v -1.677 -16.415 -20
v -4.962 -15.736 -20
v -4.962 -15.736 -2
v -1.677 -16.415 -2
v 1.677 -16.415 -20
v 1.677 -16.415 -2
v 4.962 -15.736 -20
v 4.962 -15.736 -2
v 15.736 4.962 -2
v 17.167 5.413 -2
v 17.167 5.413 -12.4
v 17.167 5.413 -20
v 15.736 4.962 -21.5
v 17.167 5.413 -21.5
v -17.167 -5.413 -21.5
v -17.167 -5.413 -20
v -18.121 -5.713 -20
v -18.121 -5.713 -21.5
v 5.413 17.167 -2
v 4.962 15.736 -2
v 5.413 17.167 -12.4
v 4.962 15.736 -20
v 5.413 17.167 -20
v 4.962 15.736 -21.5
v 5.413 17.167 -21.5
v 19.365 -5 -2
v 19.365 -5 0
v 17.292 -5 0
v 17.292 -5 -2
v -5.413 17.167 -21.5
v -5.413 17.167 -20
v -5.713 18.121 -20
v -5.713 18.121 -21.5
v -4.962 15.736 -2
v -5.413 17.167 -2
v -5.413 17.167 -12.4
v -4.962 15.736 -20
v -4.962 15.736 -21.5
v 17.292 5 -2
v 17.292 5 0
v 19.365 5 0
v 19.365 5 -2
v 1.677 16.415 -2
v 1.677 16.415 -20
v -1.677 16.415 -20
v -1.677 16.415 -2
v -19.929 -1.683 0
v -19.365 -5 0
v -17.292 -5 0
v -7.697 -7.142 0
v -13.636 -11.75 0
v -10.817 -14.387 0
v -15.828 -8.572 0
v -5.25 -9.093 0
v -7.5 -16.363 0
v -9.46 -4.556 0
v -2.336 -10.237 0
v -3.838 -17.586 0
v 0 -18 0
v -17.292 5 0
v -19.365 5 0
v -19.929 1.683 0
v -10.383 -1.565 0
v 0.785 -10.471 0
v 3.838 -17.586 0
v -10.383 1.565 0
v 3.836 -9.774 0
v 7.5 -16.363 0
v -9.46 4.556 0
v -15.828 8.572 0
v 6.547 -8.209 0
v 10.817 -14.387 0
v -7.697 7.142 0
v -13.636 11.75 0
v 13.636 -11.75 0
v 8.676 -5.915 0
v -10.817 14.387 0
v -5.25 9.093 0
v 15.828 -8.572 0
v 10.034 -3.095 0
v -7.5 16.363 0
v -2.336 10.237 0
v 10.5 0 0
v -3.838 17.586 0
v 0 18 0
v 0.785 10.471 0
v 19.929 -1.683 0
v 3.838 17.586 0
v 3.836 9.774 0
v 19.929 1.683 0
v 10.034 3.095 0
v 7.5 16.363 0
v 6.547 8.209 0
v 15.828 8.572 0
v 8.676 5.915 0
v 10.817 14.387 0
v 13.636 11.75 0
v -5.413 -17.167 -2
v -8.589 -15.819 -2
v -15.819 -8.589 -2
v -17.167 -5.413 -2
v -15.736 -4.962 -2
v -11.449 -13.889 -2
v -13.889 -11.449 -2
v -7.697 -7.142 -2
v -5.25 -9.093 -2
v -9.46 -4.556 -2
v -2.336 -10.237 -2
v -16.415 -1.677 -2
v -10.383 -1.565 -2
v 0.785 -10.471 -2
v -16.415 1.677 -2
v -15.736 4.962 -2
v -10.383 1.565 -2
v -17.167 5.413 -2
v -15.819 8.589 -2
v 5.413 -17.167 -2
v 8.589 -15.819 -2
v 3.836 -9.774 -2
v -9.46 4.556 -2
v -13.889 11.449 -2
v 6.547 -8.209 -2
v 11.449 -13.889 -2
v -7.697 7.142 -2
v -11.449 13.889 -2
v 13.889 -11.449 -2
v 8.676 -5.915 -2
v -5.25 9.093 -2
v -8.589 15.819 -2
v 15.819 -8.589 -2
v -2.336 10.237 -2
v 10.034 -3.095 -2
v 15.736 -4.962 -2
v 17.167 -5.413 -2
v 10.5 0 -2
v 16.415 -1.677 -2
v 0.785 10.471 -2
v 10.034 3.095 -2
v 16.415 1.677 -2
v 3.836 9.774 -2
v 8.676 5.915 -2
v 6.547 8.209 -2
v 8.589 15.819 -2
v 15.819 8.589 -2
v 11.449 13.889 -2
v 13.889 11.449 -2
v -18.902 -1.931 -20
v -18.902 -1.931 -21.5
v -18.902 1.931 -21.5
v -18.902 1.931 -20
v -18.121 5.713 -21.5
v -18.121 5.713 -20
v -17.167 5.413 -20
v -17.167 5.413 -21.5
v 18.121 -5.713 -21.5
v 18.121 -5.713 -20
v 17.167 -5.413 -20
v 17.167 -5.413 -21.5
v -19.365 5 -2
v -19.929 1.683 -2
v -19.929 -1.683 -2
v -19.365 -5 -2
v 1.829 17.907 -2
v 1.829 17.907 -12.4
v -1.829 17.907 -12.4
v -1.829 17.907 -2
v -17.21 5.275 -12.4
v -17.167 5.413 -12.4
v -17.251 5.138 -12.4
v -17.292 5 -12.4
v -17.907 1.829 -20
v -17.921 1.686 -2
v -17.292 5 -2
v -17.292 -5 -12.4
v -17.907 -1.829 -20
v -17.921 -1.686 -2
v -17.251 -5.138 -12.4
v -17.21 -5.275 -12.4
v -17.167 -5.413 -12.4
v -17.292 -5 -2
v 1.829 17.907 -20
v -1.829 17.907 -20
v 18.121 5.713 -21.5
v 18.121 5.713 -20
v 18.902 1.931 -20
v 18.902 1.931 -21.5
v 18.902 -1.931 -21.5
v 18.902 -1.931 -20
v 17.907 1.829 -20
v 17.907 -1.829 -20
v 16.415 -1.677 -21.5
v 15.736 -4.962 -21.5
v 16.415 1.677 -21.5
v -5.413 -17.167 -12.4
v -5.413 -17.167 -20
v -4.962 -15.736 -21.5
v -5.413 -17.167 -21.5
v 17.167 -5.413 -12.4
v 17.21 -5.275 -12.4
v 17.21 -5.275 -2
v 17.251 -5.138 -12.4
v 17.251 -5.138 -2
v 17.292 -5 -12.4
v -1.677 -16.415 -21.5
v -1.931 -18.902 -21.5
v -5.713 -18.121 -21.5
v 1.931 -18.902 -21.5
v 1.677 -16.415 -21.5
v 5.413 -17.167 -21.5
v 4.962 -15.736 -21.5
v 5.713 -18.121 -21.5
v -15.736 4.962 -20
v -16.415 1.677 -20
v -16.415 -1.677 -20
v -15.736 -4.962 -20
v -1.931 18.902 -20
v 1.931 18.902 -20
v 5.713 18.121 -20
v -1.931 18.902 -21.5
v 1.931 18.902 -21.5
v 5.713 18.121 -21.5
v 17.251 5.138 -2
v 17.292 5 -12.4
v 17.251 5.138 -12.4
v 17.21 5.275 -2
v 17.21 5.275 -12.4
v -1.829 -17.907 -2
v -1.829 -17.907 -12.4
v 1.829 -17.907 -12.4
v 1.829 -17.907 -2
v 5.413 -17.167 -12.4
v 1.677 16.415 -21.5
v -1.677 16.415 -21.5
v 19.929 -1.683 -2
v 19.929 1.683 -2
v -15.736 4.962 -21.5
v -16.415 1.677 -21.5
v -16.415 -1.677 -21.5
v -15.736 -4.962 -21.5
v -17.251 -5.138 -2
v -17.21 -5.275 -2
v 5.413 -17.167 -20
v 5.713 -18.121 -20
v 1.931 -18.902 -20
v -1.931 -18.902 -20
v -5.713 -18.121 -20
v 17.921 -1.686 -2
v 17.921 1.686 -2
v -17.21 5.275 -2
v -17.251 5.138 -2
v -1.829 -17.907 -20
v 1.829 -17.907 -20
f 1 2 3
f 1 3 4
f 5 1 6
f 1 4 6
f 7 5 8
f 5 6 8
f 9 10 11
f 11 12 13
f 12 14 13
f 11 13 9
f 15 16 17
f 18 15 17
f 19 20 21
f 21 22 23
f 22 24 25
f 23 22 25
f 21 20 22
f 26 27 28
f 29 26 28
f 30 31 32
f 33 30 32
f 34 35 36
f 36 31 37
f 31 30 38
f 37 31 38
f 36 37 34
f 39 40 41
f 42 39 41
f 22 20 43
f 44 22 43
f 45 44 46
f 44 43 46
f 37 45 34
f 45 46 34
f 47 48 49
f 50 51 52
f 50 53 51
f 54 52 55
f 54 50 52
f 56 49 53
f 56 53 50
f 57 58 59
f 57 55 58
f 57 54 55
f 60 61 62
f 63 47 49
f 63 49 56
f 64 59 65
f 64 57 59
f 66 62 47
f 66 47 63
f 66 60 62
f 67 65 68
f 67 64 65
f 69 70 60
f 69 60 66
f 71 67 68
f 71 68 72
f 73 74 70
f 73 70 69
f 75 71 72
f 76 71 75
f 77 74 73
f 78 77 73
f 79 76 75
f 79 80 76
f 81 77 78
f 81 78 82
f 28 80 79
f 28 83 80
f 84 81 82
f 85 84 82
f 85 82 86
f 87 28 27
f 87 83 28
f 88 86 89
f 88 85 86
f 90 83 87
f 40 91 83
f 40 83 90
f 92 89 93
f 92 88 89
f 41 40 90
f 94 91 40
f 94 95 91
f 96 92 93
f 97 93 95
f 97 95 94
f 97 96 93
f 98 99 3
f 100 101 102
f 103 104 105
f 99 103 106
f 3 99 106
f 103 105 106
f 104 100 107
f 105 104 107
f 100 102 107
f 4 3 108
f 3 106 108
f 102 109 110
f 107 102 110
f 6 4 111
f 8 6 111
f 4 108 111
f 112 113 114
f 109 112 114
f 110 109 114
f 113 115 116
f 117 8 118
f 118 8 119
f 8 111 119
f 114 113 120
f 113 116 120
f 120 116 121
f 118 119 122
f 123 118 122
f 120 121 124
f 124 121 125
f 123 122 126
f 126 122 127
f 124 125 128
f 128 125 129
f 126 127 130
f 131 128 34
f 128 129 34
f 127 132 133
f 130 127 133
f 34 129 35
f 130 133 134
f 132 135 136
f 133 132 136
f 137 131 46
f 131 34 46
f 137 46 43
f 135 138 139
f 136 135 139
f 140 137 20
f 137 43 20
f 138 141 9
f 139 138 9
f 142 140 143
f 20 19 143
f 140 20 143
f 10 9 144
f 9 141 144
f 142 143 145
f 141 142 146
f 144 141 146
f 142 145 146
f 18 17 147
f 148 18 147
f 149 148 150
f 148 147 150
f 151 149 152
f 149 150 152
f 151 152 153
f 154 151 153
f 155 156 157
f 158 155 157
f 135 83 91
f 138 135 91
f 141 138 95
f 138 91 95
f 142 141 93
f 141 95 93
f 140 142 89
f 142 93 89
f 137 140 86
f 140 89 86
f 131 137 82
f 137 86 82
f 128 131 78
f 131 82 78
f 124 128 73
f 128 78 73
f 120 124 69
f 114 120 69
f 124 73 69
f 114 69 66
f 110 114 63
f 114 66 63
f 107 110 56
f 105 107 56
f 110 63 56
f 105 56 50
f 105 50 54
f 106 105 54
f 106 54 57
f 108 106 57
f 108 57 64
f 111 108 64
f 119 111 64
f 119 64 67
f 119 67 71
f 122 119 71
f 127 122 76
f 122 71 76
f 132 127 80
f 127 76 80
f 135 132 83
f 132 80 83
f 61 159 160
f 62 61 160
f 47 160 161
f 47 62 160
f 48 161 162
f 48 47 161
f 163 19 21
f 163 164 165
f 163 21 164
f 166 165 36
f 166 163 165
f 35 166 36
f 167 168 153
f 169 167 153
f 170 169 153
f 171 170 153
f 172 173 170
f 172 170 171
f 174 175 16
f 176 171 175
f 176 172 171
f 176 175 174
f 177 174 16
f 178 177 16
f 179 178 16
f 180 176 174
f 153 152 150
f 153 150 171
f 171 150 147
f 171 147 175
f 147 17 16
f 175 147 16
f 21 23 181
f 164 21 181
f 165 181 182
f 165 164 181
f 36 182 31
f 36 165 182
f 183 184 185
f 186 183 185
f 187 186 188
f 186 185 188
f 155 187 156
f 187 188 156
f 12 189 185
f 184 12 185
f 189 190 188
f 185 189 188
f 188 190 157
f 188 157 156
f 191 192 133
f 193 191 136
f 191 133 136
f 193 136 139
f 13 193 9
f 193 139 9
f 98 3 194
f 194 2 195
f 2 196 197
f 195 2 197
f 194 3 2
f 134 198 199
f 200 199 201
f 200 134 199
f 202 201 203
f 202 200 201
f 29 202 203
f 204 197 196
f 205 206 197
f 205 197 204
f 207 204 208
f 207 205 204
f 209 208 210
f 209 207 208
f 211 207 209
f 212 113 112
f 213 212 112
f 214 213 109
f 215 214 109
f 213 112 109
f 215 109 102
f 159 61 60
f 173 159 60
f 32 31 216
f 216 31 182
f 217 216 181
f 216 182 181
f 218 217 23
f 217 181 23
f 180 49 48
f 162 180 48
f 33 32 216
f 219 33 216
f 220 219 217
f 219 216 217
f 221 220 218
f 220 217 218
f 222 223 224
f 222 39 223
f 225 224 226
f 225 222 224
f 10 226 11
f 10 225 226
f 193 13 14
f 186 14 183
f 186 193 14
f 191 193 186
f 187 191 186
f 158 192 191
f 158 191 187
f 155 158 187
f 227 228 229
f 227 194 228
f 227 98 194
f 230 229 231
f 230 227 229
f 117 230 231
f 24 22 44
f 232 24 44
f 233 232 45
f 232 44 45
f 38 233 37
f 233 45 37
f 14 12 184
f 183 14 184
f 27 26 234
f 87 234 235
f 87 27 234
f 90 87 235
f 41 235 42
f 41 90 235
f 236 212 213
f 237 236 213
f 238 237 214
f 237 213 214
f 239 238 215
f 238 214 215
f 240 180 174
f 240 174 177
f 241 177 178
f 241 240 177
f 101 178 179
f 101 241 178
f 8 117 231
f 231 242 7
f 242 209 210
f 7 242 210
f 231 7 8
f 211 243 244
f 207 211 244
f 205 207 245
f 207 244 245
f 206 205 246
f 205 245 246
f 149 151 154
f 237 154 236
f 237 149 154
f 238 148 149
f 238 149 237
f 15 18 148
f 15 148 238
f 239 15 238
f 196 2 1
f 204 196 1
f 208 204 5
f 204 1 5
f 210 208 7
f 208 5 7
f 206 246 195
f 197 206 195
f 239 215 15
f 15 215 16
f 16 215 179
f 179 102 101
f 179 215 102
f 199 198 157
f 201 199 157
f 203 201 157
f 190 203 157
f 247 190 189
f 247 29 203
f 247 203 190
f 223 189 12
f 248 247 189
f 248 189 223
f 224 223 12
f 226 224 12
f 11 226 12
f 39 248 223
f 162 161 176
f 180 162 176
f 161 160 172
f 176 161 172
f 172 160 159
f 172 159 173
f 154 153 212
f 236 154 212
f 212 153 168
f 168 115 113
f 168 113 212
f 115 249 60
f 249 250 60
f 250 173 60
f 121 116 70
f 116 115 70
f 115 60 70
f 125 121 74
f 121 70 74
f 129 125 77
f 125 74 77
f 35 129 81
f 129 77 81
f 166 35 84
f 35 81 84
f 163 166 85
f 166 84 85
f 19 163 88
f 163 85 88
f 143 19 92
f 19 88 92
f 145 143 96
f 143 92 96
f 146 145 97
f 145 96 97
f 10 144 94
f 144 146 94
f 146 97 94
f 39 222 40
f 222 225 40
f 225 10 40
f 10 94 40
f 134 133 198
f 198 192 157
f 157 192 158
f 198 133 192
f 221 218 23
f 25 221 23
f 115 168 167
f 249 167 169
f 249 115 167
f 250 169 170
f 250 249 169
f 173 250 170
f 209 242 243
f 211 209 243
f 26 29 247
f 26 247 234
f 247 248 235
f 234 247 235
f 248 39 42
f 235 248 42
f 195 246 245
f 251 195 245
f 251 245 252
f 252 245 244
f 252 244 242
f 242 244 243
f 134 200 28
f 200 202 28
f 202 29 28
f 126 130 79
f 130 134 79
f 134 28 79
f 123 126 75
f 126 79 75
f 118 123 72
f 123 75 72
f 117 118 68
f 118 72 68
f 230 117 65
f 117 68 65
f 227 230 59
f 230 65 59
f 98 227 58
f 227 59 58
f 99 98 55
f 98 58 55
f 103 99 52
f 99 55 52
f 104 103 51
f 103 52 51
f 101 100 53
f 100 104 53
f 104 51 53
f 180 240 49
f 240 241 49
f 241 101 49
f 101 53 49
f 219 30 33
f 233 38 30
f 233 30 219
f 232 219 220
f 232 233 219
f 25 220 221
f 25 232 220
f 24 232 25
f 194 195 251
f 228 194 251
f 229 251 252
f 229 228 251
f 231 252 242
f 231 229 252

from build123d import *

# Parameters (mm, degrees)
F0_R      = 18
F0_R_2    = 16.5
F1_DEPTH  = 20
F3_DEPTH  = 18
F5_DEPTH  = 1.5
F7_R      = 20
F7_R_2    = 10.5
F8_DEPTH  = 2
F10_DEPTH = 12.4


with BuildPart() as f1:
    # F0 (on Top) → F1 (new body)
    with BuildSketch(Plane.XY):
        Circle(F0_R)
        Circle(F0_R_2, mode=Mode.SUBTRACT)
    extrude(amount=-F1_DEPTH)

    # F2 (on face) → F3 (cut)
    with BuildSketch(Plane(origin=(0, 0, -20), x_dir=(1, 0, 0), z_dir=(0, 0, -1))):
        with BuildLine():
            ThreePointArc((-5.4127043911, 17.1669051135), (-12.7279220614, 12.7279220614), (-17.1669051135, 5.4127043911))
            Line((-17.1669051135, 5.4127043911), (-15.7363296873, 4.9616456918))
            ThreePointArc((-15.7363296873, 4.9616456918), (-11.6672618896, 11.6672618896), (-4.9616456918, 15.7363296873))
            Line((-4.9616456918, 15.7363296873), (-5.4127043911, 17.1669051135))
        make_face()
        with BuildLine():
            Line((-15.7363296873, -4.9616456918), (-17.1669051135, -5.4127043911))
            ThreePointArc((-17.1669051135, -5.4127043911), (-12.7279220614, -12.7279220614), (-5.4127043911, -17.1669051135))
            Line((-5.4127043911, -17.1669051135), (-4.9616456918, -15.7363296873))
            ThreePointArc((-4.9616456918, -15.7363296873), (-11.6672618896, -11.6672618896), (-15.7363296873, -4.9616456918))
        make_face()
        with BuildLine():
            ThreePointArc((15.7363296873, -4.9616456918), (11.6672618896, -11.6672618896), (4.9616456918, -15.7363296873))
            Line((4.9616456918, -15.7363296873), (5.4127043911, -17.1669051135))
            ThreePointArc((5.4127043911, -17.1669051135), (12.7279220614, -12.7279220614), (17.1669051135, -5.4127043911))
            Line((17.1669051135, -5.4127043911), (15.7363296873, -4.9616456918))
        make_face()
        with BuildLine():
            Line((5.4127043911, 17.1669051135), (4.9616456918, 15.7363296873))
            ThreePointArc((4.9616456918, 15.7363296873), (11.6672618896, 11.6672618896), (15.7363296873, 4.9616456918))
            Line((15.7363296873, 4.9616456918), (17.1669051135, 5.4127043911))
            ThreePointArc((17.1669051135, 5.4127043911), (12.7279220614, 12.7279220614), (5.4127043911, 17.1669051135))
        make_face()
    extrude(amount=-F3_DEPTH, mode=Mode.SUBTRACT)

    # F4 (on face) → F5 (join)
    with BuildSketch(Plane(origin=(0, 0, -20), x_dir=(1, 0, 0), z_dir=(0, 0, -1))):
        with BuildLine():
            Line((-15.7363296873, 4.9616456918), (-17.1669051135, 5.4127043911))
            ThreePointArc((-17.1669051135, 5.4127043911), (-18, 0), (-17.1669051135, -5.4127043911))
            Line((-17.1669051135, -5.4127043911), (-15.7363296873, -4.9616456918))
            ThreePointArc((-15.7363296873, -4.9616456918), (-16.5, 0), (-15.7363296873, 4.9616456918))
        make_face()
        with BuildLine():
            ThreePointArc((-17.1669051135, -5.4127043911), (-18, 0), (-17.1669051135, 5.4127043911))
            Line((-17.1669051135, 5.4127043911), (-18.1206220642, 5.7134101906))
            ThreePointArc((-18.1206220642, 5.7134101906), (-19, 0), (-18.1206220642, -5.7134101906))
            Line((-18.1206220642, -5.7134101906), (-17.1669051135, -5.4127043911))
        make_face()
        with BuildLine():
            ThreePointArc((4.9616456918, -15.7363296873), (0, -16.5), (-4.9616456918, -15.7363296873))
            Line((-4.9616456918, -15.7363296873), (-5.4127043911, -17.1669051135))
            ThreePointArc((-5.4127043911, -17.1669051135), (0, -18), (5.4127043911, -17.1669051135))
            Line((5.4127043911, -17.1669051135), (4.9616456918, -15.7363296873))
        make_face()
        with BuildLine():
            ThreePointArc((5.4127043911, -17.1669051135), (0, -18), (-5.4127043911, -17.1669051135))
            Line((-5.4127043911, -17.1669051135), (-5.7134101906, -18.1206220642))
            ThreePointArc((-5.7134101906, -18.1206220642), (0, -19), (5.7134101906, -18.1206220642))
            Line((5.7134101906, -18.1206220642), (5.4127043911, -17.1669051135))
        make_face()
        with BuildLine():
            ThreePointArc((15.7363296873, 4.9616456918), (16.5, 0), (15.7363296873, -4.9616456918))
            Line((15.7363296873, -4.9616456918), (17.1669051135, -5.4127043911))
            ThreePointArc((17.1669051135, -5.4127043911), (18, 0), (17.1669051135, 5.4127043911))
            Line((17.1669051135, 5.4127043911), (15.7363296873, 4.9616456918))
        make_face()
        with BuildLine():
            ThreePointArc((17.1669051135, 5.4127043911), (18, 0), (17.1669051135, -5.4127043911))
            Line((17.1669051135, -5.4127043911), (18.1206220642, -5.7134101906))
            ThreePointArc((18.1206220642, -5.7134101906), (19, 0), (18.1206220642, 5.7134101906))
            Line((18.1206220642, 5.7134101906), (17.1669051135, 5.4127043911))
        make_face()
        with BuildLine():
            ThreePointArc((-4.9616456918, 15.7363296873), (0, 16.5), (4.9616456918, 15.7363296873))
            Line((4.9616456918, 15.7363296873), (5.4127043911, 17.1669051135))
            ThreePointArc((5.4127043911, 17.1669051135), (0, 18), (-5.4127043911, 17.1669051135))
            Line((-5.4127043911, 17.1669051135), (-4.9616456918, 15.7363296873))
        make_face()
        with BuildLine():
            ThreePointArc((-5.4127043911, 17.1669051135), (0, 18), (5.4127043911, 17.1669051135))
            Line((5.4127043911, 17.1669051135), (5.7134101906, 18.1206220642))
            ThreePointArc((5.7134101906, 18.1206220642), (0, 19), (-5.7134101906, 18.1206220642))
            Line((-5.7134101906, 18.1206220642), (-5.4127043911, 17.1669051135))
        make_face()
    extrude(amount=F5_DEPTH)

    # F7 (on face) → F8 (join)
    with BuildSketch(Plane.XY):
        Circle(F7_R)
        Circle(F7_R_2, mode=Mode.SUBTRACT)
    extrude(amount=-F8_DEPTH)

    # F9 (on face) → F10 (cut)
    with BuildSketch(Plane.XY):
        with BuildLine():
            Line((17.2916164658, 5), (19.364916731, 5))
            ThreePointArc((19.364916731, 5), (0, 20), (-19.364916731, 5))
            Line((-19.364916731, 5), (-17.2916164658, 5))
            ThreePointArc((-17.2916164658, 5), (0, 18), (17.2916164658, 5))
        make_face()
        with BuildLine():
            Line((-17.2916164658, -5), (-19.364916731, -5))
            ThreePointArc((-19.364916731, -5), (0, -20), (19.364916731, -5))
            Line((19.364916731, -5), (17.2916164658, -5))
            ThreePointArc((17.2916164658, -5), (0, -18), (-17.2916164658, -5))
        make_face()
    extrude(amount=-F10_DEPTH, mode=Mode.SUBTRACT)


solid = f1.part
